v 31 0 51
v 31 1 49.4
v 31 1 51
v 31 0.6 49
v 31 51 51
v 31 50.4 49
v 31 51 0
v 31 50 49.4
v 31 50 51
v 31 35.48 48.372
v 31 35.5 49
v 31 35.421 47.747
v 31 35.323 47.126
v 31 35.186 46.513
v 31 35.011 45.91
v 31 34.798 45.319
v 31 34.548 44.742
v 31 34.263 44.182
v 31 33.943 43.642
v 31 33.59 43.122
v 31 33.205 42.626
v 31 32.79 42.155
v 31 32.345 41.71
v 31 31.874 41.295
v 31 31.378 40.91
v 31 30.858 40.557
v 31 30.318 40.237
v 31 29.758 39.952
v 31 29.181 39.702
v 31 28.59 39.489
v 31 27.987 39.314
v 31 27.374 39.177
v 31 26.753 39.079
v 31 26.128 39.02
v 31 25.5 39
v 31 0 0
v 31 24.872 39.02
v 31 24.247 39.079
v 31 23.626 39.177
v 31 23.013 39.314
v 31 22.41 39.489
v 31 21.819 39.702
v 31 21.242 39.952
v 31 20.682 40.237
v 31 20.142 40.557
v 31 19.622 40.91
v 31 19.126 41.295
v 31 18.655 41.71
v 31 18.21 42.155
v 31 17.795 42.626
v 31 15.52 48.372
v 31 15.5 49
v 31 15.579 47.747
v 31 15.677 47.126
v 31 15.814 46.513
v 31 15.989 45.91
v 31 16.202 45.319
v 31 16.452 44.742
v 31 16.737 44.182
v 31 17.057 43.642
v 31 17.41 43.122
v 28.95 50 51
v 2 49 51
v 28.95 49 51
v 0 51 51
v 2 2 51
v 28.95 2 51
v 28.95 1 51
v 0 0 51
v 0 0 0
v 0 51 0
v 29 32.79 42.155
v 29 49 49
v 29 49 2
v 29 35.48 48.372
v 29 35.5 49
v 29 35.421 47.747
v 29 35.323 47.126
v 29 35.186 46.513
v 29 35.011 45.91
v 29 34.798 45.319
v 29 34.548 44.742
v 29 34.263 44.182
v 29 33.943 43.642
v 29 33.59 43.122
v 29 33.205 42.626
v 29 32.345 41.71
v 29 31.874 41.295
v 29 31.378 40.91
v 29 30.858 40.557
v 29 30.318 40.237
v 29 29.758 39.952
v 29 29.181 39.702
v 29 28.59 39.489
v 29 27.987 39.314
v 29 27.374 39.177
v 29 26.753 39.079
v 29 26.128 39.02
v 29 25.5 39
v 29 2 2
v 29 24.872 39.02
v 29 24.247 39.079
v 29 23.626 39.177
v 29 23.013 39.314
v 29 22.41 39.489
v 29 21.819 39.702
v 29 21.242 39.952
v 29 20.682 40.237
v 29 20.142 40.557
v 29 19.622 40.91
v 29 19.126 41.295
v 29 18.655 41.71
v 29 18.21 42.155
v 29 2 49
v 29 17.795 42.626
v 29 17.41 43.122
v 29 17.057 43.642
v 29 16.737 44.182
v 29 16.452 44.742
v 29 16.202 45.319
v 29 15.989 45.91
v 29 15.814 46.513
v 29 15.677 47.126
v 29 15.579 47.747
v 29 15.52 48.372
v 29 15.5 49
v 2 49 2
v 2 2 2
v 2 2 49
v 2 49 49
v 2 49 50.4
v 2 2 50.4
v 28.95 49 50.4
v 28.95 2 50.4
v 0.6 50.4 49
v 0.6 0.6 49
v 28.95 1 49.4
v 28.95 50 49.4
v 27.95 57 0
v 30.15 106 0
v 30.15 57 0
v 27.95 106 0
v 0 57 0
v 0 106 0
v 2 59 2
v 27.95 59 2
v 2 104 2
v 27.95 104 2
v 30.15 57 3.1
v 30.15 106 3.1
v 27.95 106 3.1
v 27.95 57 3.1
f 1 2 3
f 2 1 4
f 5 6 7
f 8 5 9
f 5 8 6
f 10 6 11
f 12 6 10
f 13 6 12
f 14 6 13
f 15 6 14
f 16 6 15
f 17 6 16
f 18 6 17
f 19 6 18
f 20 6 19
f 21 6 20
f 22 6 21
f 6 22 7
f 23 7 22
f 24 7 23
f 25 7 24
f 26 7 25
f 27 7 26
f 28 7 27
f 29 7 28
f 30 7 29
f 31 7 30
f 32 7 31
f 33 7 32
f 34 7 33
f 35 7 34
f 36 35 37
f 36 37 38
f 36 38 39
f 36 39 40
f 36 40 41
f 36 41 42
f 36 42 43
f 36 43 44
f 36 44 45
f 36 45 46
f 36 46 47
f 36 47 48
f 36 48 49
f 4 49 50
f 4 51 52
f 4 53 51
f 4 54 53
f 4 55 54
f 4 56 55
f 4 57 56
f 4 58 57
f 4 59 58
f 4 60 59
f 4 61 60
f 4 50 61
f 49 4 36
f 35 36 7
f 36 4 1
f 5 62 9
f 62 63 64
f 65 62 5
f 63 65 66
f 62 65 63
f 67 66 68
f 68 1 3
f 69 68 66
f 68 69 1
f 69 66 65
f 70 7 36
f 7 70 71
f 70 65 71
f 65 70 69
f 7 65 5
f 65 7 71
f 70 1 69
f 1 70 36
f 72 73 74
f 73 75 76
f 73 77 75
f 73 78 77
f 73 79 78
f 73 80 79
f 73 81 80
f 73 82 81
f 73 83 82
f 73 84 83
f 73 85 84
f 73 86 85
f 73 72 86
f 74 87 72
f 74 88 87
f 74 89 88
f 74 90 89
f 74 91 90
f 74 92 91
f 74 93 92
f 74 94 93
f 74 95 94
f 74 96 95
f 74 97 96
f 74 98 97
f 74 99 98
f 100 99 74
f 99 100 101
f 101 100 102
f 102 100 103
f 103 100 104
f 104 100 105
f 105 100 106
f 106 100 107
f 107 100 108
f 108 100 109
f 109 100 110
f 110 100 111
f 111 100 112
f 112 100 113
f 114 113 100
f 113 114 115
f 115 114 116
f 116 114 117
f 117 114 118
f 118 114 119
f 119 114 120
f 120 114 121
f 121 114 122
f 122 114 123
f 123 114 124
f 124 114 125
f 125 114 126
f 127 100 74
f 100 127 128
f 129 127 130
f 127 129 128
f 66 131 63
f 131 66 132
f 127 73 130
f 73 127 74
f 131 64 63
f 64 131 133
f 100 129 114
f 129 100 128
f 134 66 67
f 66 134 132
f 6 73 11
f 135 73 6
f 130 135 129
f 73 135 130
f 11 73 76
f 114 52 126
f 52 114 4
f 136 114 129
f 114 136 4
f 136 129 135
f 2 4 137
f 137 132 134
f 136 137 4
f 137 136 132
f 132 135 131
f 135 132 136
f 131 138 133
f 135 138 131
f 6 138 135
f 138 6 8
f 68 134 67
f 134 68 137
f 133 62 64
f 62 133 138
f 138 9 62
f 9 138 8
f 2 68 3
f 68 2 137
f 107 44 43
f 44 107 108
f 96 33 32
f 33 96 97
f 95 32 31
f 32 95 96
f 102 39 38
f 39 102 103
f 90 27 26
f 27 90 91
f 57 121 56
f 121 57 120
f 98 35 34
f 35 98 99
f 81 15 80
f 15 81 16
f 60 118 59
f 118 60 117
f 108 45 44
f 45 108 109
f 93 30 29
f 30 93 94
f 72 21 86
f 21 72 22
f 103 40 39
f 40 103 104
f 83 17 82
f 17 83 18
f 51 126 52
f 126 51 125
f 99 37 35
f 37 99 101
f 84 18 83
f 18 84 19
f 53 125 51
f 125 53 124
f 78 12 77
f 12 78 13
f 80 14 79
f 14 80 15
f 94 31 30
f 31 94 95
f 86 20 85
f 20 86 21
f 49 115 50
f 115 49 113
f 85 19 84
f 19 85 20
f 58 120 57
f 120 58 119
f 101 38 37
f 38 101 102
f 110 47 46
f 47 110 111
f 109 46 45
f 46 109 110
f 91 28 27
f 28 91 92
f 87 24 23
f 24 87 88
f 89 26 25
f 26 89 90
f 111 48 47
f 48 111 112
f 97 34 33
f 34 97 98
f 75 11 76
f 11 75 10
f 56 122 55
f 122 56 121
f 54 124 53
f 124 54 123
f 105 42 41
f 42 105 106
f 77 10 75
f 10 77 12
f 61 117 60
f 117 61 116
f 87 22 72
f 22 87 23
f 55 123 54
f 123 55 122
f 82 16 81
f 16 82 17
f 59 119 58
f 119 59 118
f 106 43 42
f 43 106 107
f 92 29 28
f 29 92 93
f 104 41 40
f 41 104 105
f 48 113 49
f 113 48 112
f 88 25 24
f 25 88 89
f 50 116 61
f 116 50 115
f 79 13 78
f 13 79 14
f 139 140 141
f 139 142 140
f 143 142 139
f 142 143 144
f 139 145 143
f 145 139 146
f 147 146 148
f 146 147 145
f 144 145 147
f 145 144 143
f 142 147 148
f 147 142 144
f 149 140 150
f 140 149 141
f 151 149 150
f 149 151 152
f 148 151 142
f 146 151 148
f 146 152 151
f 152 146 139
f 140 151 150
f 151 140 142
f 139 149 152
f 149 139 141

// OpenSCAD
// file: carcassonne_box.scad
/**
 * @file carcassonne_box.scad
 * @author Conlan Wesson (modified by [Your Name])
 * Template for Carcassonne boxes.
 * @copyright Creative Commons Attribution-NonCommercial-ShareAlike 4.0
 */

mm = 1;
cm = 10*mm;

tiles = 2*mm;
clearance = 3*mm;

width = 47*mm;
thick = 2.5*mm;
wall = 2*mm;

/**
 * Lid for box.
 * @param sections Array of section lengths.
 * @param columns Number of columns.
 * @param icon Path to icon DXF file.
 * @param rot Icon rotation in degrees.
 * @param mult Icon scale.
 * @param xoff X-offset of icon from center.
 * @param yoff Y-offset of icon from center.
 */
module carcassonne_lid(sections, columns=1, icon=false, icon2=false, icon3=false, rot=0, mult=1, xoff=0, yoff=0, mult2=1, xoff2=0, yoff2=0, mult3=1, xoff3=0, yoff3=0, g=0){
    divider_thickness = wall/2;
    length = sum(sections) + (divider_thickness * (len(sections) - 1));
    w = length+(1.5*wall)+.1;
    l = (width*columns)+wall;
    h = wall;
    d = 2;

    CubePoints = [
        [ 0-g, 0-g,   0 ],  //0
        [ w+g, 0-g,   0 ],  //1
        [ w+g, l+g,   0 ],  //2
        [ 0-g, l+g,   0 ],  //3
        [   d,   d, h+g ],  //4
        [   w,   d, h+g ],  //5
        [   w, l-d, h+g ],  //6
        [   d, l-d, h+g ]   //7
    ];

    CubeFaces = [
        [0,1,2,3],  // bottom
        [4,5,1,0],  // front
        [7,6,5,4],  // top
        [5,6,2,1],  // right
        [6,7,3,2],  // back
        [7,4,0,3]   // left
    ];

    difference(){
        union(){
            polyhedron( CubePoints, CubeFaces );
            translate([w-wall-.15,0,0]) cube([wall+.2,l, (1.5*wall)+.1]);
        }
        if(icon){
            translate([w/2+xoff,l/3+yoff,h-(wall/2)]){
                linear_extrude(height=(wall)+.1){
                    rotate(rot) scale(mult) import(icon);
                }
            }
        }
        if(icon2){
            translate([w/2+xoff2,l/3+yoff2,h-(wall/2)]){
                linear_extrude(height=(wall)+.1){
                    rotate(rot) scale(mult2) import(icon2);
                }
            }
        }
        if(icon3){
            translate([w/2+xoff3,l/3+yoff3,h-(wall/2)]){
                linear_extrude(height=(wall)+.1){
                    rotate(rot) scale(mult3) import(icon3);
                }
            }
        }
    }
}

/**
 * Carcassonne card box.
 * @param sections Array of section lengths.
 * @param columns Number of columns.
 */
module carcassonne_box(sections, columns=1){
    divider_thickness = wall/2;
    raw_length = sum(sections) + (divider_thickness * (len(sections) - 1));
    length = raw_length;

    section_count = len(sections);

    difference(){
        union(){
            difference(){
                // Outer walls
                cube([length+(2*wall), (width*columns)+(2*wall), width+(2*wall)]);
                // Cavity
                translate([wall, wall, wall]){
                    cube([length, width*columns, (width+wall)+.1]);
                }
            }
            // Dividers
            for(col = [0:columns-1]){
                divider_positions = [for(i=0; i<len(sections)-1; i=i+1) 
                    sum([for(j=[0:i]) sections[j]]) + (i * divider_thickness)];
                for(pos = divider_positions){
                    translate([pos+wall, width*col+wall, 0]) 
                        cube([divider_thickness, width, width-(2*wall)]);
                }
                if(col > 0){
                    translate([0, width*col+(wall/2), 0]) 
                        cube([length+(2*wall)-18.0, wall/2, width-(2*wall)]);
                }
            }
        }
        union(){
            // Notch
            for(col = [0:columns-1]){
                translate([wall, wall+(width*col), wall]){
                    translate([0, width/2, width])
                    rotate([0, 90, 0]){
                        cylinder(r=10, h=length+(2*wall), $fn=100);
                    }
                }
            }
            // Track
            translate([wall/2, wall/2, width+wall])
                carcassonne_lid(sections, columns, g=0.4);
        }
    }
}


// Helper function to sum an array
function sum(v, i = 0, r = 0) = i < len(v) ? sum(v, i + 1, r + v[i]) : r;
// main file
/**
 * @file peasants.scad
 * @author Andrew Hargrave
 * Peasant Revolts Carcossonne box.
 * @copyright Creative Commons Attribution-NonCommercial-ShareAlike 4.0
 */

include <carcassonne_box.scad>

sections = [(12 * tiles + clearance)];
columns = 1; 
icon="0-peasants.dxf";

carcassonne_box(sections, columns);
translate([0,width*columns+10,0]) carcassonne_lid(sections, columns, icon, rot=90, mult=2.2, xoff=21, yoff=-9); 
